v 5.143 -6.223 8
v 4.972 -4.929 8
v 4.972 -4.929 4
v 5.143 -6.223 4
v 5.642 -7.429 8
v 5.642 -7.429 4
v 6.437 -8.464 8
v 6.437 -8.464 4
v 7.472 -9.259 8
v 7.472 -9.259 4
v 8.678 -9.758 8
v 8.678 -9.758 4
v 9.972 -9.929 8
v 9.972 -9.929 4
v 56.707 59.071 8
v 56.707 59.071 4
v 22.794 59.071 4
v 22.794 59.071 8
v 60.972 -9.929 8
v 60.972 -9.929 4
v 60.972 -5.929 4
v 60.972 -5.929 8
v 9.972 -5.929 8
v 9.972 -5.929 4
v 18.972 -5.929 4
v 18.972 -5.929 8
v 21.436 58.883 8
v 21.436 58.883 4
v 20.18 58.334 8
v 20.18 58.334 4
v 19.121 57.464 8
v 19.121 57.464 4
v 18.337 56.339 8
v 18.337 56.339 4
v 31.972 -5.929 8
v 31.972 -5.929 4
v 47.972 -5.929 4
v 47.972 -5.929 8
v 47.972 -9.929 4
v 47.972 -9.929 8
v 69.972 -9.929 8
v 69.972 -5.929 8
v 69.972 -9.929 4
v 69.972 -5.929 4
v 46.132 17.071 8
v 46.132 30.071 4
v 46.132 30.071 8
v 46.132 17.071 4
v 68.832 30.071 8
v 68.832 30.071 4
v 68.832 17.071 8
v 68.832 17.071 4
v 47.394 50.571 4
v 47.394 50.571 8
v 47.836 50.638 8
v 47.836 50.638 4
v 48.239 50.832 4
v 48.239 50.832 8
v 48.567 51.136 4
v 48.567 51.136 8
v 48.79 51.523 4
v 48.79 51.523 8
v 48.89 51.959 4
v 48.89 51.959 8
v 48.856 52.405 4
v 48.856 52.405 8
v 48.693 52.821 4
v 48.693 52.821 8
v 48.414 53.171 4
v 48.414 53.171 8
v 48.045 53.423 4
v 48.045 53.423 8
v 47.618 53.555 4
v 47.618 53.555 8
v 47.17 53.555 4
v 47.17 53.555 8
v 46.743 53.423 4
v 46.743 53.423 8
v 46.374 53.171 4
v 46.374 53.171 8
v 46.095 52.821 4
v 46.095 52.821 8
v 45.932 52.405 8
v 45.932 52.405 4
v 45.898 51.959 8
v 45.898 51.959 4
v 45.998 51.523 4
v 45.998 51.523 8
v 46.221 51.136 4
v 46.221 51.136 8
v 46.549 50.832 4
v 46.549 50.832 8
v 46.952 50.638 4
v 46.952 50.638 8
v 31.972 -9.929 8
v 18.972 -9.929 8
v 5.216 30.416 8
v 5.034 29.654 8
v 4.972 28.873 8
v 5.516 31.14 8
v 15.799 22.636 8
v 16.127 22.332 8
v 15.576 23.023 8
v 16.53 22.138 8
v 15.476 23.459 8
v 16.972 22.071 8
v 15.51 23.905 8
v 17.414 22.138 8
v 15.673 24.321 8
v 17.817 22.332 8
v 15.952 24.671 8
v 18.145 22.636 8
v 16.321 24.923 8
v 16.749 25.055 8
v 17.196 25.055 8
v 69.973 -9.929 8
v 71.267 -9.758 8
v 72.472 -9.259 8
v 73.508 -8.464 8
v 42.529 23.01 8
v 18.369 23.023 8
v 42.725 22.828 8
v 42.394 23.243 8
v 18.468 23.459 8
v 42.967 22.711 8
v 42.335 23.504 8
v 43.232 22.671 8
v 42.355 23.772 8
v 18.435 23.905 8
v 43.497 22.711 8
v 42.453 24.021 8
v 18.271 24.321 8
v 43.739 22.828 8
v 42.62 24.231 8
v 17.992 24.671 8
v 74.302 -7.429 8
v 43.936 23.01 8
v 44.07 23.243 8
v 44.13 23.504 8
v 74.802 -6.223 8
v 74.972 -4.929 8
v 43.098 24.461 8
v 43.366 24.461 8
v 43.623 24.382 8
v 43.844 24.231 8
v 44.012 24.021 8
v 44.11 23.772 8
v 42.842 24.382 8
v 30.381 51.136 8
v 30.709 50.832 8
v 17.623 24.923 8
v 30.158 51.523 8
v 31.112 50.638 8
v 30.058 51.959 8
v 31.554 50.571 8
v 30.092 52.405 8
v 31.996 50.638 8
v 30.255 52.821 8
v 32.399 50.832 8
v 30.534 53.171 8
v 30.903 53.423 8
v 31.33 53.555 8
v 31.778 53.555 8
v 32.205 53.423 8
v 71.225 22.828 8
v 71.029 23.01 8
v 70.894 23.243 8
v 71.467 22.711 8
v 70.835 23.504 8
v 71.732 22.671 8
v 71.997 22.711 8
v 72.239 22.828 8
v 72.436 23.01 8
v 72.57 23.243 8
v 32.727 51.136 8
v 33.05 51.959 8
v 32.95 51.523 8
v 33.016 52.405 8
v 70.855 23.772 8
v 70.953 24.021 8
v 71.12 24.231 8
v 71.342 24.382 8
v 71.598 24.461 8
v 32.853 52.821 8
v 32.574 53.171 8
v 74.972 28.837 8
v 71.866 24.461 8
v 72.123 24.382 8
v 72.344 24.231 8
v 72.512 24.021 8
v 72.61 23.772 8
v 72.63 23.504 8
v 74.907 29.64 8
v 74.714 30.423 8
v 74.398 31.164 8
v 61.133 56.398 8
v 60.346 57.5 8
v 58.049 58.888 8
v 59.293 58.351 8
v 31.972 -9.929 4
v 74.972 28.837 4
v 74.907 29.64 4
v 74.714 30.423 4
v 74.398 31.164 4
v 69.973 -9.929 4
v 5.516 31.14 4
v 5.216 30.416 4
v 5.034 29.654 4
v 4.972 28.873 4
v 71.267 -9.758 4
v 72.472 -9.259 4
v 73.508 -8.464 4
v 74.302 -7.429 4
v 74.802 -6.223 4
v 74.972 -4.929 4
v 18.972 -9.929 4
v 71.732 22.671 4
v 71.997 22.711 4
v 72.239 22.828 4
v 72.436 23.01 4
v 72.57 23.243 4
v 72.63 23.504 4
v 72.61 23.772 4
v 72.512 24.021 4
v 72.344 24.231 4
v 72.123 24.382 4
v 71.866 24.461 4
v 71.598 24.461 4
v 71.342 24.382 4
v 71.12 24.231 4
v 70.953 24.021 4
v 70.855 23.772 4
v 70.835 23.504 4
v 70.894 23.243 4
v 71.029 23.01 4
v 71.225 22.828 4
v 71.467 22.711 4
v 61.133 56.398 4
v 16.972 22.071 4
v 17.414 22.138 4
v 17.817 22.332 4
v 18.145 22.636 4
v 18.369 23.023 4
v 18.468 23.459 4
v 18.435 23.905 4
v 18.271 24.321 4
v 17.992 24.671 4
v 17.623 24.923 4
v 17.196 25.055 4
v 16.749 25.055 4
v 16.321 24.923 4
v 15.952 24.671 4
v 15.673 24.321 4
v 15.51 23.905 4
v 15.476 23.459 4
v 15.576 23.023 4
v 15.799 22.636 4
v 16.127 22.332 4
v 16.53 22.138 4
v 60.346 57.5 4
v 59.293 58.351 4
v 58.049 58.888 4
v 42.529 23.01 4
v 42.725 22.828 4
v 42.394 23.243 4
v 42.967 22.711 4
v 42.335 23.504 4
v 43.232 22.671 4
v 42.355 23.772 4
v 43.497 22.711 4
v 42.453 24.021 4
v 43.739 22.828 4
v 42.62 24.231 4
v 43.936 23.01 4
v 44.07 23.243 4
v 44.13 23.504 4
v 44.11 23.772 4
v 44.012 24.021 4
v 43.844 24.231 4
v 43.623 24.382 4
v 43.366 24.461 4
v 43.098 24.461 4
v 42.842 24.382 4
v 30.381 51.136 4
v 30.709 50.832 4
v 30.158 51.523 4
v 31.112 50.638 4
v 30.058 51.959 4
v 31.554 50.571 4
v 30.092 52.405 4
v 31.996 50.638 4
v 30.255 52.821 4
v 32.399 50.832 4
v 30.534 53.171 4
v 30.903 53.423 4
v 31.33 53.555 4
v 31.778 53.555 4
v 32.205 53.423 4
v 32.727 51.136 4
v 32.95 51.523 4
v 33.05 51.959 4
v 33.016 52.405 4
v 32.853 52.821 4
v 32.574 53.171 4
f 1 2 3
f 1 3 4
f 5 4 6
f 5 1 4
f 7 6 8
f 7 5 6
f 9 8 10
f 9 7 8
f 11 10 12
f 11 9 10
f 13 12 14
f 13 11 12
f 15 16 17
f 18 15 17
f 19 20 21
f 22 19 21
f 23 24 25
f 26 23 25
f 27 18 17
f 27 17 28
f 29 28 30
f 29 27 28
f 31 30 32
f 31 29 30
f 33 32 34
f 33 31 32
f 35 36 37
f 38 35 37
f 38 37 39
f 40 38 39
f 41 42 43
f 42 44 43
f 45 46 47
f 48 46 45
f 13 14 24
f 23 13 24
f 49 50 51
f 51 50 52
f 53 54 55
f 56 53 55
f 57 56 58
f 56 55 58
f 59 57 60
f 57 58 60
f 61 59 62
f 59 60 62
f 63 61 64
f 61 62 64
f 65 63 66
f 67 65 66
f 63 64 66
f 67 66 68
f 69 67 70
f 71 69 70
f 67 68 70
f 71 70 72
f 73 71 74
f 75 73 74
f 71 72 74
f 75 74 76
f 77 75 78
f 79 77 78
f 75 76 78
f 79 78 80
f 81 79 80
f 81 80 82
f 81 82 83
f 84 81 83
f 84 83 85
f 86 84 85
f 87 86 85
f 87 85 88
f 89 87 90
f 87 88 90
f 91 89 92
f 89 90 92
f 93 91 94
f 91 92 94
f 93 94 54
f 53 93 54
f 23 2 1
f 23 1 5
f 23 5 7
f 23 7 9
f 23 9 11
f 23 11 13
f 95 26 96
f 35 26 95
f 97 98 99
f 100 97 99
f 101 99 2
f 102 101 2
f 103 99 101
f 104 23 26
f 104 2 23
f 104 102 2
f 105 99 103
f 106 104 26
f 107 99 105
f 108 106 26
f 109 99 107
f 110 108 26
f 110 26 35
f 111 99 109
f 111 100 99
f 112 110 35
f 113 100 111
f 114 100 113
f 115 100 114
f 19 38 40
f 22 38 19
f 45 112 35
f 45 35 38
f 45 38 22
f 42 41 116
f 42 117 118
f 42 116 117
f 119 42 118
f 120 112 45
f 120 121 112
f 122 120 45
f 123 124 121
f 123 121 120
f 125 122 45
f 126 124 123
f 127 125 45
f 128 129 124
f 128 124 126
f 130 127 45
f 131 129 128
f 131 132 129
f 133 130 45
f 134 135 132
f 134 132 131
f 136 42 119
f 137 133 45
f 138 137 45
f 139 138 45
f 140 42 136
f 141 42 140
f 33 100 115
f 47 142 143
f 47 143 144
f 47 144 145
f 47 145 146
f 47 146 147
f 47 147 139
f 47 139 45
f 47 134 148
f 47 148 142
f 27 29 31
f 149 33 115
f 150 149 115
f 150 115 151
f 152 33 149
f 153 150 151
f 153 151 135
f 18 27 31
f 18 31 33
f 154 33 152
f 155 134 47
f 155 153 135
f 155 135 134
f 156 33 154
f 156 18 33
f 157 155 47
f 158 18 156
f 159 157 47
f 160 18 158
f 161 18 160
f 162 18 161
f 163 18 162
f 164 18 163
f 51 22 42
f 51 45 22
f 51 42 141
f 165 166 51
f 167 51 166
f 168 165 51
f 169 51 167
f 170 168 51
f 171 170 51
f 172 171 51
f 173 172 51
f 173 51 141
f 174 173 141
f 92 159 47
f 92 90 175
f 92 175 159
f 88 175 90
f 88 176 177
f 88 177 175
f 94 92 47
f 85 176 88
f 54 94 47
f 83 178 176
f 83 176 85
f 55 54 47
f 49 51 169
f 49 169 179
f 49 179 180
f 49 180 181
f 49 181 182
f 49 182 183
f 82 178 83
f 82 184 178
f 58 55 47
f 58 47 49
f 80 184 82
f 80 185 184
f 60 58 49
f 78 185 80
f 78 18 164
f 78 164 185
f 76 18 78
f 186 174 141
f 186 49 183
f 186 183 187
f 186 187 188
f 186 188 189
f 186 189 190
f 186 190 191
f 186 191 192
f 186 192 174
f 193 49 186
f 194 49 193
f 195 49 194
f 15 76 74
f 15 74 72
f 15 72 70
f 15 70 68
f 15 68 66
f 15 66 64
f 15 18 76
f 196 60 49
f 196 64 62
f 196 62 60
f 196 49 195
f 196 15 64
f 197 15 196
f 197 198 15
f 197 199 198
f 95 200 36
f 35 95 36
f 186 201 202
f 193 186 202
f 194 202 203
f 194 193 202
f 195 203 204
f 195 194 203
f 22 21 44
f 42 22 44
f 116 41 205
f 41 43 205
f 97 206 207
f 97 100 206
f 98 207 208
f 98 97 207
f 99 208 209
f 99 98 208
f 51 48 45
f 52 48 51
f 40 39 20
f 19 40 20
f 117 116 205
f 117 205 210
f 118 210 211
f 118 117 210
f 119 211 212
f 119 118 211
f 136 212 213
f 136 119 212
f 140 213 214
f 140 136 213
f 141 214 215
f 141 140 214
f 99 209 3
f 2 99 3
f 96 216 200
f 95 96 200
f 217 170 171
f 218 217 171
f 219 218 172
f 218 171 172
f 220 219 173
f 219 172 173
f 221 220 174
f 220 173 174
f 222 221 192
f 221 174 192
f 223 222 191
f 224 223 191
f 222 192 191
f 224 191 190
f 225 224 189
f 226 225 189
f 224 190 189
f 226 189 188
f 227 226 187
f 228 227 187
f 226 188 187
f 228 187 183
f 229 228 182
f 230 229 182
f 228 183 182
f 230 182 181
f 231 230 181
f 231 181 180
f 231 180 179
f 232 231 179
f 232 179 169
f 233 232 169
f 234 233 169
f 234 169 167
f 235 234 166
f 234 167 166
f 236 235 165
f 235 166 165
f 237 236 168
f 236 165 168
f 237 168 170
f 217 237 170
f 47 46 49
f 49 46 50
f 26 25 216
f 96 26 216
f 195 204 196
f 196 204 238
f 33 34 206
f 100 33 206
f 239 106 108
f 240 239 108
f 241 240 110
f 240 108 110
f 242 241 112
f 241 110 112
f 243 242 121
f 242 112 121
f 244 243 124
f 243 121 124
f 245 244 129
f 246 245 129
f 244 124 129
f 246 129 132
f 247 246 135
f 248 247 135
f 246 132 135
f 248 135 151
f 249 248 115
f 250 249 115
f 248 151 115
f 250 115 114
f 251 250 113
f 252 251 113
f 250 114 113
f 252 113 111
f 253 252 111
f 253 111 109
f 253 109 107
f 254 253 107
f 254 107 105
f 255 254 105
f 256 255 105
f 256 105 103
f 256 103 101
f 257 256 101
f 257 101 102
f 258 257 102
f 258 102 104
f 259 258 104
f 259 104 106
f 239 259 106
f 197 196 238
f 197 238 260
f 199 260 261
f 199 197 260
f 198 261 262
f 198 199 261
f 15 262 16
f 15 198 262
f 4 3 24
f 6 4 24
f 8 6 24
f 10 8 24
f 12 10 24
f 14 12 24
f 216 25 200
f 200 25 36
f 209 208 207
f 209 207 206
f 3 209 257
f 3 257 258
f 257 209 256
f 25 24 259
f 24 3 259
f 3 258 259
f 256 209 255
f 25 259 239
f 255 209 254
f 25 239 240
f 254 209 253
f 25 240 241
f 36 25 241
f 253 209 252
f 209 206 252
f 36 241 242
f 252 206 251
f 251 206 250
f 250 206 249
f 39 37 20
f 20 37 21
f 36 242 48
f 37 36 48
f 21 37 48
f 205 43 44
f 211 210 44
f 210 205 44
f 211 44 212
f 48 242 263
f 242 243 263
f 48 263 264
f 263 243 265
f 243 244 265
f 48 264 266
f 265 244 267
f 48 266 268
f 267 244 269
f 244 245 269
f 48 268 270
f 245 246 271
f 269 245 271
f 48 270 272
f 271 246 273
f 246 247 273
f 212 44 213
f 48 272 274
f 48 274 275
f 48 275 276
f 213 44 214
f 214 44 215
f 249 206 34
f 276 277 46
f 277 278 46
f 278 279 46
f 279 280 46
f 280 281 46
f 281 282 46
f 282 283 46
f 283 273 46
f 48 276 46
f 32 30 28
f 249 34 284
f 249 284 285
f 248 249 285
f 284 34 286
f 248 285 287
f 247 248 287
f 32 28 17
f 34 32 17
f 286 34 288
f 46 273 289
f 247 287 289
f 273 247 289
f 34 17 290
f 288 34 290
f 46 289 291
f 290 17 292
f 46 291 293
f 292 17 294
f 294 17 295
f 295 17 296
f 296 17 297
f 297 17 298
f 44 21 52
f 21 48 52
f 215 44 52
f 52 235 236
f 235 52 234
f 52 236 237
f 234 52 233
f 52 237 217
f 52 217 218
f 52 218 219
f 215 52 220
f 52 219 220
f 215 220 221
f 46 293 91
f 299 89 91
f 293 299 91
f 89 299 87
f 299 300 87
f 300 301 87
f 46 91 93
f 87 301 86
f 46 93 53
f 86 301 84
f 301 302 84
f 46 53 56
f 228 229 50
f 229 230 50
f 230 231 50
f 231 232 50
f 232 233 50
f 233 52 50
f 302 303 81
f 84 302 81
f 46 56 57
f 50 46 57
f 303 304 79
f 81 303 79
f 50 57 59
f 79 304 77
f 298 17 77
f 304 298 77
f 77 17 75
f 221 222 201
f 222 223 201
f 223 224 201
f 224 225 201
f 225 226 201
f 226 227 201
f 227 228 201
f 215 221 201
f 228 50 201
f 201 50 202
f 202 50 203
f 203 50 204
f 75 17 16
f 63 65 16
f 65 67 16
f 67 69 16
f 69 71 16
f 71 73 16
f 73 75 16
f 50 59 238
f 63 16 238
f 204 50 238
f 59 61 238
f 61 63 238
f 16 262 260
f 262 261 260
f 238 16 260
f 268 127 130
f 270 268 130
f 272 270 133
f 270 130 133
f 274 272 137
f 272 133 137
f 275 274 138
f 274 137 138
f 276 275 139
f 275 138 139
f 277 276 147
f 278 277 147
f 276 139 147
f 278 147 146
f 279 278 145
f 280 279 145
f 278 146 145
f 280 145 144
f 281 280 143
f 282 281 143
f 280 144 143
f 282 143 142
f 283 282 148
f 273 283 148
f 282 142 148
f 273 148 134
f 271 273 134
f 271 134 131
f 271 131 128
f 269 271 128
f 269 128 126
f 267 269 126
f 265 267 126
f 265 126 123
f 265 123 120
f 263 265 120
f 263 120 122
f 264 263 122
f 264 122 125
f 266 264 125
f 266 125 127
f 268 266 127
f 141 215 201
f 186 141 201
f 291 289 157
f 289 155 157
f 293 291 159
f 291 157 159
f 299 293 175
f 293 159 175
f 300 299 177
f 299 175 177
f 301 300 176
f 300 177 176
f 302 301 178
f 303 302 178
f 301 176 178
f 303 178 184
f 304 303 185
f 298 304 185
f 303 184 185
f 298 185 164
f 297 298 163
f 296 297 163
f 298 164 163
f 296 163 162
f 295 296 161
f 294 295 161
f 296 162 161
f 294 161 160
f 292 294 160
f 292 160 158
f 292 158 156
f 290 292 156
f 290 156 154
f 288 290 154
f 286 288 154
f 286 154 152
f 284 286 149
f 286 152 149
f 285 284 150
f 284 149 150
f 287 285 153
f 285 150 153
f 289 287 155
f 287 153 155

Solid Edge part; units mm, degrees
sketch "Sketch1" plane through (39.9722, 24.5714, 4) normal (0, 0, 1) x (1, 0, 0)
  line L0 (-35, 5.5) -> (-35, -34.5)
  line L1 (-35, -34.5) -> (-30, -34.5)
  line L2 (-30, -34.5) -> (-30, -30.5)
  line L3 (-30, -30.5) -> (-21, -30.5)
  line L4 (-21, -30.5) -> (-21, -34.5)
  line L5 (-21, -34.5) -> (-8, -34.5)
  line L6 (-8, -34.5) -> (-8, -30.5)
  line L7 (-8, -30.5) -> (8, -30.5)
  line L8 (8, -30.5) -> (8, -34.5)
  line L9 (8, -34.5) -> (21, -34.5)
  line L10 (21, -34.5) -> (21, -30.5)
  line L11 (21, -30.5) -> (30, -30.5)
  line L12 (30, -30.5) -> (30, -34.5)
  line L13 (30, -34.5) -> (35, -34.5)
  line L14 (35, -34.5) -> (35, 5.5)
  line L15 (35, 5.5) -> (19.7554, 34.5)
  line L16 (19.7554, 34.5) -> (-20.2446, 34.5)
  line L17 (-20.2446, 34.5) -> (-35, 5.5)
  line L18 (28, 5.5) -> (28.86, 5.5)
  line L19 (28.86, 5.5) -> (28.86, -7.5)
  line L20 (28, -7.5) -> (28.86, -7.5)
  line L21 (6.8, -7.5) -> (28, -7.5)
  line L22 (6.16, -7.5) -> (6.8, -7.5)
  line L23 (6.16, 5.5) -> (6.16, -7.5)
  line L24 (6.8, 5.5) -> (6.16, 5.5)
  line L25 (6.8, 5.5) -> (28, 5.5)
extrude "Protrusion1" add sketch "Sketch1" along normal blind 4
hole "Furo_18" at (43.2322, 23.5714, 8) direction (0, 0, -1) diameter 1.8 end up to next
hole "Hole1" at (71.7322, 23.5714, 8) direction (0, 0, -1) diameter 1.8 end up to next
hole "Furo_23" at (31.554, 52.0714, 8) direction (0, 0, -1) diameter 3 end up to next
hole "Hole2" at (47.394, 52.0714, 8) direction (0, 0, -1) diameter 3 end up to next
hole "Hole3" at (16.9722, 23.5714, 8) direction (0, 0, -1) diameter 3 end up to next
fillet "Redondo_6" radius 5 4 edges at (59.7276, 59.0714, 6) (74.9722, 30.0714, 6) (19.7276, 59.0714, 6) (4.9722, 30.0714, 6)
fillet "Redondo_7" radius 5 2 edges at (4.9722, -9.9286, 6) (74.9722, -9.9286, 6)
